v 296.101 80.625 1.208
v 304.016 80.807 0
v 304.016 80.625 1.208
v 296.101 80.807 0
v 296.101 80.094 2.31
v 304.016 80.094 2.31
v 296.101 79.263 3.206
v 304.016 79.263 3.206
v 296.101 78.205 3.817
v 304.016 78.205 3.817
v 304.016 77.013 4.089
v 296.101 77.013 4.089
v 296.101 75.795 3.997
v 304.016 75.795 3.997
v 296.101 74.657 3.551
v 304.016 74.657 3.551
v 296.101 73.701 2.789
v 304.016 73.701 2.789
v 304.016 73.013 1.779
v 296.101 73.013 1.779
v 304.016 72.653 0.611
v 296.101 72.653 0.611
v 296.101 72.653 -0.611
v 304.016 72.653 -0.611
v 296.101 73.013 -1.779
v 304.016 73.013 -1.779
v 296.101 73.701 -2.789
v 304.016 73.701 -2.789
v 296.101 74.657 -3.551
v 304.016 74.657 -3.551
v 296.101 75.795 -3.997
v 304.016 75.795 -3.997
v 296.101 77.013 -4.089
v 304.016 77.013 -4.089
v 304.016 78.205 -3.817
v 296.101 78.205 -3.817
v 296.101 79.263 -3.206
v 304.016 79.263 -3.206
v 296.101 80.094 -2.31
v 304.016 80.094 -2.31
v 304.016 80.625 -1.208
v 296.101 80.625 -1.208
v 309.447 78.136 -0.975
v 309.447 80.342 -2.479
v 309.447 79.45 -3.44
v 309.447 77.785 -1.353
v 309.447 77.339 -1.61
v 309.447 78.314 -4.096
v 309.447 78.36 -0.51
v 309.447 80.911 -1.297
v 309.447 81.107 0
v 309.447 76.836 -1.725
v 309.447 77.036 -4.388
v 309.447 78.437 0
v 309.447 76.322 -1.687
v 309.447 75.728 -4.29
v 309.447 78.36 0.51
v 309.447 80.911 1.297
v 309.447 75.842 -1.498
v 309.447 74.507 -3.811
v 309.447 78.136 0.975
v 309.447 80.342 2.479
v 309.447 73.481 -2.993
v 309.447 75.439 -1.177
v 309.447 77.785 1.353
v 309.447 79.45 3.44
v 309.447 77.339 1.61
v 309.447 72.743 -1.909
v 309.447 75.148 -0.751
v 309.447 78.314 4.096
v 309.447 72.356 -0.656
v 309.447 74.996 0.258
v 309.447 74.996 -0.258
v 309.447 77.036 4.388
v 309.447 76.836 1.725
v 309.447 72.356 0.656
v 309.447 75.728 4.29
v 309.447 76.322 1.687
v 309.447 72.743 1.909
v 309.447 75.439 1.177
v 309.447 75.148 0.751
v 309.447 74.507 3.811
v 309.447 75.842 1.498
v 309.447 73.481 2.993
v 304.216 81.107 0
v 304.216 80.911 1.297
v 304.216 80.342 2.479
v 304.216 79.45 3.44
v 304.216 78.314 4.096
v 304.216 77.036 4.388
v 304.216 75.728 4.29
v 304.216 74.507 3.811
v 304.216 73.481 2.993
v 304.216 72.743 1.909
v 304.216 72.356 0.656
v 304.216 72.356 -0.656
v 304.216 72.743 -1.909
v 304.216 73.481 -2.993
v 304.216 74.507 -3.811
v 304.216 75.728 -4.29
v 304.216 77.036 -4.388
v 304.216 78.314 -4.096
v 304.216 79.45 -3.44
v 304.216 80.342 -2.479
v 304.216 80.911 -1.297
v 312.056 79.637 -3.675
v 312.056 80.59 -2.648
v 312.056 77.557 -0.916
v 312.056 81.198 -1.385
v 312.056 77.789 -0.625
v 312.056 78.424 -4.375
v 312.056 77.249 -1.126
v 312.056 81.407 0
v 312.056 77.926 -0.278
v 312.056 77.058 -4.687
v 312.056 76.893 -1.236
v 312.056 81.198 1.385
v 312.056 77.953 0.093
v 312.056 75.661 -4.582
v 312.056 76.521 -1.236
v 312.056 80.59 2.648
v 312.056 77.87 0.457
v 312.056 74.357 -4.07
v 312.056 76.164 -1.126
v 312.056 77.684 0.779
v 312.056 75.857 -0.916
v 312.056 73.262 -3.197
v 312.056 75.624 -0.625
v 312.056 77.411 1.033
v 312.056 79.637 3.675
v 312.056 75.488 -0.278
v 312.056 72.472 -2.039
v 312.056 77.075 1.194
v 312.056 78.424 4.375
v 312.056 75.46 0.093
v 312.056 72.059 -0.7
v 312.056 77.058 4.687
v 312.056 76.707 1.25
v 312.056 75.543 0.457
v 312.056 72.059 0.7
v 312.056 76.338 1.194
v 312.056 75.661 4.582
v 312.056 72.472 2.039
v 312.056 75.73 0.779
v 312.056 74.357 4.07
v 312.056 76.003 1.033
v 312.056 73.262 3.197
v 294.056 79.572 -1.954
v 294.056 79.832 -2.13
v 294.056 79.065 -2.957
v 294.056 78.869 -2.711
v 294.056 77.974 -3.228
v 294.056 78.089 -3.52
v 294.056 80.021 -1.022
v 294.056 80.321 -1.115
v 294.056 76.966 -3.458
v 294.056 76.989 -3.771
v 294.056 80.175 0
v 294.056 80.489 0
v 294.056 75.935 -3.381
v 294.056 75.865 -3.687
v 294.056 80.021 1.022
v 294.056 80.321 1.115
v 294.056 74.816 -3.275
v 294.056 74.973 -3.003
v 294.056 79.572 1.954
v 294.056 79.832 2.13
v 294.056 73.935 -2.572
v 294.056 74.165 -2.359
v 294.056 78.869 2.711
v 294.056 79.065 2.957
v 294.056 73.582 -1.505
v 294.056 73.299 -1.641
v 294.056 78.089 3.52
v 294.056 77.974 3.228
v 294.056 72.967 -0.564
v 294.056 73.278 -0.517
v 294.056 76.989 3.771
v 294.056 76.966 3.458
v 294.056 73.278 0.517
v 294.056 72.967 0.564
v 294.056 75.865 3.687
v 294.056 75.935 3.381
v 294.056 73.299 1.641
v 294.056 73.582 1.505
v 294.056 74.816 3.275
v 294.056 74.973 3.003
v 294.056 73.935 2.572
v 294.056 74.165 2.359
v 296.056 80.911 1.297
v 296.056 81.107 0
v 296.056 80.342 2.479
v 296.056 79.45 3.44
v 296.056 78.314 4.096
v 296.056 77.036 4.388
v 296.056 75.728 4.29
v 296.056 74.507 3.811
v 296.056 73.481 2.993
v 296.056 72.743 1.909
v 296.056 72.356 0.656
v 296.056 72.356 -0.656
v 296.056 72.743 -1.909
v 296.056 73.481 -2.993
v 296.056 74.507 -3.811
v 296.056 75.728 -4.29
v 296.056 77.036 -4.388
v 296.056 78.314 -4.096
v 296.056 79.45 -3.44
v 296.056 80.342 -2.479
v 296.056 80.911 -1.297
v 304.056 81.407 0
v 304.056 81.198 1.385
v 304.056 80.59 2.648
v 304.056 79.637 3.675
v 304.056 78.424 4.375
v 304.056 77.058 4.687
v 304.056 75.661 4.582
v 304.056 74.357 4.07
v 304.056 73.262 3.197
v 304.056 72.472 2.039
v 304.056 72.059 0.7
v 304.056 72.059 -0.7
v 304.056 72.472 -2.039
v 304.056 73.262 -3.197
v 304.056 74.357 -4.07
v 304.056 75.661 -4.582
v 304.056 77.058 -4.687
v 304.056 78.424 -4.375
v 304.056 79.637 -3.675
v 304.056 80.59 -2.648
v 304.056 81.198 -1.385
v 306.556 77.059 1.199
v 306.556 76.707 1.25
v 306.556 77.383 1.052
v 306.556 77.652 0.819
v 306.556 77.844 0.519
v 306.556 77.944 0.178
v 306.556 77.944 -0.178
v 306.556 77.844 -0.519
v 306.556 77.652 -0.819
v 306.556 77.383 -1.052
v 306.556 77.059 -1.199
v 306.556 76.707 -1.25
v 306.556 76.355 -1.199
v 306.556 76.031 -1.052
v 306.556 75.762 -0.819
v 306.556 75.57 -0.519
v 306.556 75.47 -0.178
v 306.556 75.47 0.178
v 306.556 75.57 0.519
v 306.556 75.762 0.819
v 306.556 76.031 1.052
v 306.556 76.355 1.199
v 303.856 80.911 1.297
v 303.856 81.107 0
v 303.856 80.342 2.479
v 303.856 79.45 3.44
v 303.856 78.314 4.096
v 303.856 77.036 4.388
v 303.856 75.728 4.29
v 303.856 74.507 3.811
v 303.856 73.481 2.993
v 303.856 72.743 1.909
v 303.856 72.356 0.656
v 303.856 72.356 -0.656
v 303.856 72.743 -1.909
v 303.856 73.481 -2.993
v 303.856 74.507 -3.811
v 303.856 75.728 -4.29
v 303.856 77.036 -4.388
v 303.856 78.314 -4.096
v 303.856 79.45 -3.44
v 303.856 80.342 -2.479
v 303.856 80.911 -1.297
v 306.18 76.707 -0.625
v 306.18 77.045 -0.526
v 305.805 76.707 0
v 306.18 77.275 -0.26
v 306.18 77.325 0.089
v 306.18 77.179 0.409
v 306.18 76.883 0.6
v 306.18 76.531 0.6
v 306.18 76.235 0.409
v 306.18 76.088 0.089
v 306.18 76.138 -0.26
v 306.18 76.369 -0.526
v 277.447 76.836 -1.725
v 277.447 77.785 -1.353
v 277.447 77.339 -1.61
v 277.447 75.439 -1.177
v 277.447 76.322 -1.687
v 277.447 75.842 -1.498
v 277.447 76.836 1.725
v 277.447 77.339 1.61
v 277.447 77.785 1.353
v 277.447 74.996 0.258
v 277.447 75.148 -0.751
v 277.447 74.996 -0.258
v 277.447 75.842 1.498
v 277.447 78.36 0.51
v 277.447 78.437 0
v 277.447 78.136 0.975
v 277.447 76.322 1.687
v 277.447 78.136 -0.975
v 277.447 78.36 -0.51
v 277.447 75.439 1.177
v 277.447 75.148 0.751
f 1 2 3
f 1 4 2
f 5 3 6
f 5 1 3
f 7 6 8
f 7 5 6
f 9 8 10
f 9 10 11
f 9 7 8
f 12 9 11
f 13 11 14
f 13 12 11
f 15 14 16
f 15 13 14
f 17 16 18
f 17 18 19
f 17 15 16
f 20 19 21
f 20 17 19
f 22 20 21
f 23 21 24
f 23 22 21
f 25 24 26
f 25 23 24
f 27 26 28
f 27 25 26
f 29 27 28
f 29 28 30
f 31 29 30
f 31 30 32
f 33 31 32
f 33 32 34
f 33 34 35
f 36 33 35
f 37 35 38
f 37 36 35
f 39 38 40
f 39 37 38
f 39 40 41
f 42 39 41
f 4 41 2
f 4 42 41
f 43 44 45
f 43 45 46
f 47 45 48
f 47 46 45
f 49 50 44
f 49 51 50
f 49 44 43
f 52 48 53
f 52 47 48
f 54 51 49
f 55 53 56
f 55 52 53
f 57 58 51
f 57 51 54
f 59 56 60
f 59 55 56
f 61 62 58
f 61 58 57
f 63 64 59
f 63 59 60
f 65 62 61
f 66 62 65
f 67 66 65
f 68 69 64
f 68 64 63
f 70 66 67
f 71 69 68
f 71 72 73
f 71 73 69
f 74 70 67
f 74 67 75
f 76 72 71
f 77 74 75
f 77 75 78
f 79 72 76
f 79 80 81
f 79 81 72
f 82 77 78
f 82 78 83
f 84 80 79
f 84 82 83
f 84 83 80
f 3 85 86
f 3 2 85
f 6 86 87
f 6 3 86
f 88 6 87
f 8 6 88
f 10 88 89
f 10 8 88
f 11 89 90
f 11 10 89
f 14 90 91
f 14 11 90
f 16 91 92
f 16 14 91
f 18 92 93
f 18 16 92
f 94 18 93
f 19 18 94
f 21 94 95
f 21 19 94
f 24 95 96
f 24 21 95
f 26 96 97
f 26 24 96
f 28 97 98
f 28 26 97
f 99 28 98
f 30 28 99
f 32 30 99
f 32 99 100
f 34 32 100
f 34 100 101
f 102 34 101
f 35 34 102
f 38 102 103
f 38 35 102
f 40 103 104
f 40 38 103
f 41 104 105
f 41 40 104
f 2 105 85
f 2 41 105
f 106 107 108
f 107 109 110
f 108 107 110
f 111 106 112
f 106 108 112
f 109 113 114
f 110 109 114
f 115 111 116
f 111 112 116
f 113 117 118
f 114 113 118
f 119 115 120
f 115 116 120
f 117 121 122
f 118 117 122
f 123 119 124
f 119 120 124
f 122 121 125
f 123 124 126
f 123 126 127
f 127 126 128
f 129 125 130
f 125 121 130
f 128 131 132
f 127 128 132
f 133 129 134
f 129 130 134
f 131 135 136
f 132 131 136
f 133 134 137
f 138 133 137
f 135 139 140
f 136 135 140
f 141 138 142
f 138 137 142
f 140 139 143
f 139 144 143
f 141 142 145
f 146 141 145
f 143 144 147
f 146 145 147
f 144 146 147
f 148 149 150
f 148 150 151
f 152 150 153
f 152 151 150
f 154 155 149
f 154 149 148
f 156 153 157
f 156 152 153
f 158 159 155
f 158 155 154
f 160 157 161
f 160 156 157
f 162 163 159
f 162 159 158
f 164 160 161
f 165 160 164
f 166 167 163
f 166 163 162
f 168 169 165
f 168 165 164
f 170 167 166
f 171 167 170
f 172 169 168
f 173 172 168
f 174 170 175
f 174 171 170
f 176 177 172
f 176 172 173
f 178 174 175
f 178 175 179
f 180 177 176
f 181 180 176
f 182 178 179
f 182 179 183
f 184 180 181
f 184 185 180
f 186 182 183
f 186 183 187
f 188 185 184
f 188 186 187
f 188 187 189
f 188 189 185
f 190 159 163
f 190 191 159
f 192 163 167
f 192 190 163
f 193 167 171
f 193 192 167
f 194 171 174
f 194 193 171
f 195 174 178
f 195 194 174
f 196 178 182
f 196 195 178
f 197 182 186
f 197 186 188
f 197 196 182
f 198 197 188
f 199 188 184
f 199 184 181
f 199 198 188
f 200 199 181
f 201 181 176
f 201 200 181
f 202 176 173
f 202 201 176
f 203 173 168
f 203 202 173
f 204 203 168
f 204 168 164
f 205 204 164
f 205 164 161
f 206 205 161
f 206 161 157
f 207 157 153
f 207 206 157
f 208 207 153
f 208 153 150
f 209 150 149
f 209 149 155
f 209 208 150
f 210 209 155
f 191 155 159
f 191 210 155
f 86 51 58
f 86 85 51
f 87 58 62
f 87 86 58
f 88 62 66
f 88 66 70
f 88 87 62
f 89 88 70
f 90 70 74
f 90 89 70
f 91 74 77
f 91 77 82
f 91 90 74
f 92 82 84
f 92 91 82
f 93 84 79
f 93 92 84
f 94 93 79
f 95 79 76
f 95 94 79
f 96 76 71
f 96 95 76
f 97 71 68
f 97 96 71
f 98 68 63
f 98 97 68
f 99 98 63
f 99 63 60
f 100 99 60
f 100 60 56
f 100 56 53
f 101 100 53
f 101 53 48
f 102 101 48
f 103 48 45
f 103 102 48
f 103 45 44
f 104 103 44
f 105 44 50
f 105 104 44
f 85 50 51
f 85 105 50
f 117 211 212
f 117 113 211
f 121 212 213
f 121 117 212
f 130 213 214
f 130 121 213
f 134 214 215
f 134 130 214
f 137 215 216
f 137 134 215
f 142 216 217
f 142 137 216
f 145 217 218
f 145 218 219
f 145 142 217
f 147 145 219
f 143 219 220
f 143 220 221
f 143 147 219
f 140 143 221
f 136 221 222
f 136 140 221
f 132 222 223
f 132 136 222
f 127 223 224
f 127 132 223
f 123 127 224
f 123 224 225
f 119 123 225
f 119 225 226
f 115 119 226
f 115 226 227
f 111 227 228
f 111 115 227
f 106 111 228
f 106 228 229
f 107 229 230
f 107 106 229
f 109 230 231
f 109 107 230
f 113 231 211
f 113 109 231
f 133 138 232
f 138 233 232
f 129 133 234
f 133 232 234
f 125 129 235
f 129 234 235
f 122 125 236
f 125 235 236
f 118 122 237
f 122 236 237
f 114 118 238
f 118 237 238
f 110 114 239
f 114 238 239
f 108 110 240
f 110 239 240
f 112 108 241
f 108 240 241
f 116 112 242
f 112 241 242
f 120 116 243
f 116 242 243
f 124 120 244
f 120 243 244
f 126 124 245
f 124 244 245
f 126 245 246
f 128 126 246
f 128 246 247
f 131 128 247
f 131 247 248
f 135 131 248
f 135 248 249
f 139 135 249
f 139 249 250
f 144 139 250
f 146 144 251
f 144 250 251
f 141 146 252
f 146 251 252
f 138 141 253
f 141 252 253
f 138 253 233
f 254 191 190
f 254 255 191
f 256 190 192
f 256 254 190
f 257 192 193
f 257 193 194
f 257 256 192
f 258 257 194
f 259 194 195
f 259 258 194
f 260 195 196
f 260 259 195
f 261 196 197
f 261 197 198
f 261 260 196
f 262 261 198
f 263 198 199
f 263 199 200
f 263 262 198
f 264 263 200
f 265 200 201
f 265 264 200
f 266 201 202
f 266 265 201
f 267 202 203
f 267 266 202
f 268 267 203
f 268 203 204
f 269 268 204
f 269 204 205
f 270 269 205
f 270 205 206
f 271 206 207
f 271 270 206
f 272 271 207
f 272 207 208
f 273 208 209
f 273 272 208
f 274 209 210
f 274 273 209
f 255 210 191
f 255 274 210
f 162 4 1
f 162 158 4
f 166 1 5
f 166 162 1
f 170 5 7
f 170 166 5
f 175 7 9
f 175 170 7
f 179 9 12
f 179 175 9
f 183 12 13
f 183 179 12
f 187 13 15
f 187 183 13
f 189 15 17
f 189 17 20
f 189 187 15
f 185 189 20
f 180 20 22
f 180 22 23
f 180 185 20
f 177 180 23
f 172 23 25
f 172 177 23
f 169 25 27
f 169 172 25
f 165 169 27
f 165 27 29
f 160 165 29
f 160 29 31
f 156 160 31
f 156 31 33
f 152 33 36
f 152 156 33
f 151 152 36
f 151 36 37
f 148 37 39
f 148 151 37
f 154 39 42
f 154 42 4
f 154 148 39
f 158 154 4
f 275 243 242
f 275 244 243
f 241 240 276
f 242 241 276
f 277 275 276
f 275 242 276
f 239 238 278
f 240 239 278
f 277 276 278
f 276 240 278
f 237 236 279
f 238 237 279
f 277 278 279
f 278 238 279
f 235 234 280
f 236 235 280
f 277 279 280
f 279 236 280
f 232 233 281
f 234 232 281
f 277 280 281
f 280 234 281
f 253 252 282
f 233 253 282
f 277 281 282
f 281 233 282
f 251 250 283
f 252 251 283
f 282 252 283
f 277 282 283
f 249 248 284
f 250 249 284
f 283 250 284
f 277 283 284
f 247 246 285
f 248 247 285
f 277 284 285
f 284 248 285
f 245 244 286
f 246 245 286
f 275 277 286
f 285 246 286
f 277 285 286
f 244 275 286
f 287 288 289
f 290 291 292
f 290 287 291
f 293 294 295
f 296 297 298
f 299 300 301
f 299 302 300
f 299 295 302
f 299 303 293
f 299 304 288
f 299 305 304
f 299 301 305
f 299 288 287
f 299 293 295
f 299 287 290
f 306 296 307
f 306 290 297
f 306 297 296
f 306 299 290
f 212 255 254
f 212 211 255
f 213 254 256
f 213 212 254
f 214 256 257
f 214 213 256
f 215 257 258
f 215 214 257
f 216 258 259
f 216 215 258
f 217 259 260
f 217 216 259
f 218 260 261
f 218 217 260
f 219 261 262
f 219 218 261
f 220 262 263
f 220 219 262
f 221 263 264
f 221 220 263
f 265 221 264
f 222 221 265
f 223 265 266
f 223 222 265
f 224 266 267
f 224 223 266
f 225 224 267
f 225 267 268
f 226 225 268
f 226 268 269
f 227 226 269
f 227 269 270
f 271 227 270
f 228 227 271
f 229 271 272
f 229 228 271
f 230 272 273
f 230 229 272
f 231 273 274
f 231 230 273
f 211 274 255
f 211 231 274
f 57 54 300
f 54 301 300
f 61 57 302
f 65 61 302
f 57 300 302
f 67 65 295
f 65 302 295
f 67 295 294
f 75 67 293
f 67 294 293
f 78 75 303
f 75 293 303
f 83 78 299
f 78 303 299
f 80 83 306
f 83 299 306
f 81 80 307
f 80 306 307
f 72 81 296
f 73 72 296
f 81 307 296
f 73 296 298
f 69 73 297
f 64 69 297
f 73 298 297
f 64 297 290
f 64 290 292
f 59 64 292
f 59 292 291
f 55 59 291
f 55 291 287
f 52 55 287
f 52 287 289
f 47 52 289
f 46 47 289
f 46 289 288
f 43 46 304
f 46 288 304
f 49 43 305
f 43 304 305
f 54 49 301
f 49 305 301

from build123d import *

# Parameters (mm, degrees)
TAP_DRILL_FOR_M3_TAP1_D     = 2.5
TAP_DRILL_FOR_M3_TAP1_DEPTH = 5.5
TAP_DRILL_FOR_M3_TAP1_TIP   = 0.751075774


with BuildPart() as part:
    # Sketch2 → Revolve4 (revolve)
    with BuildSketch(Plane.XY):
        Polygon((296.055680528, 81.106851928), (303.855680528, 81.106851928), (304.055680528, 81.406851928), (312.055680528, 81.406851928), (312.055680528, 79.406851928), (312.055680528, 76.706851928), (277.446915198, 76.706851928), (277.446915198, 78.436851928), (294.046915198, 78.436851928), (309.446915198, 78.436851928), (309.446915198, 81.106851928), (304.216235656, 81.106851928), (304.016235656, 80.806851928), (296.100980113, 80.806851928), (294.055680528, 80.174765167), (294.055680528, 80.488764715), align=None)
    revolve(axis=Axis((277.446915198, 76.706851928, 0), (1, 0, 0)))

    # Tap Drill for M3 Tap1
    with Locations(Plane(origin=(312.055680528, 0, 0), x_dir=(0, 0, -1), z_dir=(1, 0, 0))):
        with Locations((0, 76.706851928)):
            Hole(TAP_DRILL_FOR_M3_TAP1_D / 2, depth=TAP_DRILL_FOR_M3_TAP1_DEPTH)
            with Locations((0, 0, -(TAP_DRILL_FOR_M3_TAP1_DEPTH + TAP_DRILL_FOR_M3_TAP1_TIP / 2))):  # 118° drill point
                Cone(0, TAP_DRILL_FOR_M3_TAP1_D / 2, TAP_DRILL_FOR_M3_TAP1_TIP, mode=Mode.SUBTRACT)


solid = part.part
